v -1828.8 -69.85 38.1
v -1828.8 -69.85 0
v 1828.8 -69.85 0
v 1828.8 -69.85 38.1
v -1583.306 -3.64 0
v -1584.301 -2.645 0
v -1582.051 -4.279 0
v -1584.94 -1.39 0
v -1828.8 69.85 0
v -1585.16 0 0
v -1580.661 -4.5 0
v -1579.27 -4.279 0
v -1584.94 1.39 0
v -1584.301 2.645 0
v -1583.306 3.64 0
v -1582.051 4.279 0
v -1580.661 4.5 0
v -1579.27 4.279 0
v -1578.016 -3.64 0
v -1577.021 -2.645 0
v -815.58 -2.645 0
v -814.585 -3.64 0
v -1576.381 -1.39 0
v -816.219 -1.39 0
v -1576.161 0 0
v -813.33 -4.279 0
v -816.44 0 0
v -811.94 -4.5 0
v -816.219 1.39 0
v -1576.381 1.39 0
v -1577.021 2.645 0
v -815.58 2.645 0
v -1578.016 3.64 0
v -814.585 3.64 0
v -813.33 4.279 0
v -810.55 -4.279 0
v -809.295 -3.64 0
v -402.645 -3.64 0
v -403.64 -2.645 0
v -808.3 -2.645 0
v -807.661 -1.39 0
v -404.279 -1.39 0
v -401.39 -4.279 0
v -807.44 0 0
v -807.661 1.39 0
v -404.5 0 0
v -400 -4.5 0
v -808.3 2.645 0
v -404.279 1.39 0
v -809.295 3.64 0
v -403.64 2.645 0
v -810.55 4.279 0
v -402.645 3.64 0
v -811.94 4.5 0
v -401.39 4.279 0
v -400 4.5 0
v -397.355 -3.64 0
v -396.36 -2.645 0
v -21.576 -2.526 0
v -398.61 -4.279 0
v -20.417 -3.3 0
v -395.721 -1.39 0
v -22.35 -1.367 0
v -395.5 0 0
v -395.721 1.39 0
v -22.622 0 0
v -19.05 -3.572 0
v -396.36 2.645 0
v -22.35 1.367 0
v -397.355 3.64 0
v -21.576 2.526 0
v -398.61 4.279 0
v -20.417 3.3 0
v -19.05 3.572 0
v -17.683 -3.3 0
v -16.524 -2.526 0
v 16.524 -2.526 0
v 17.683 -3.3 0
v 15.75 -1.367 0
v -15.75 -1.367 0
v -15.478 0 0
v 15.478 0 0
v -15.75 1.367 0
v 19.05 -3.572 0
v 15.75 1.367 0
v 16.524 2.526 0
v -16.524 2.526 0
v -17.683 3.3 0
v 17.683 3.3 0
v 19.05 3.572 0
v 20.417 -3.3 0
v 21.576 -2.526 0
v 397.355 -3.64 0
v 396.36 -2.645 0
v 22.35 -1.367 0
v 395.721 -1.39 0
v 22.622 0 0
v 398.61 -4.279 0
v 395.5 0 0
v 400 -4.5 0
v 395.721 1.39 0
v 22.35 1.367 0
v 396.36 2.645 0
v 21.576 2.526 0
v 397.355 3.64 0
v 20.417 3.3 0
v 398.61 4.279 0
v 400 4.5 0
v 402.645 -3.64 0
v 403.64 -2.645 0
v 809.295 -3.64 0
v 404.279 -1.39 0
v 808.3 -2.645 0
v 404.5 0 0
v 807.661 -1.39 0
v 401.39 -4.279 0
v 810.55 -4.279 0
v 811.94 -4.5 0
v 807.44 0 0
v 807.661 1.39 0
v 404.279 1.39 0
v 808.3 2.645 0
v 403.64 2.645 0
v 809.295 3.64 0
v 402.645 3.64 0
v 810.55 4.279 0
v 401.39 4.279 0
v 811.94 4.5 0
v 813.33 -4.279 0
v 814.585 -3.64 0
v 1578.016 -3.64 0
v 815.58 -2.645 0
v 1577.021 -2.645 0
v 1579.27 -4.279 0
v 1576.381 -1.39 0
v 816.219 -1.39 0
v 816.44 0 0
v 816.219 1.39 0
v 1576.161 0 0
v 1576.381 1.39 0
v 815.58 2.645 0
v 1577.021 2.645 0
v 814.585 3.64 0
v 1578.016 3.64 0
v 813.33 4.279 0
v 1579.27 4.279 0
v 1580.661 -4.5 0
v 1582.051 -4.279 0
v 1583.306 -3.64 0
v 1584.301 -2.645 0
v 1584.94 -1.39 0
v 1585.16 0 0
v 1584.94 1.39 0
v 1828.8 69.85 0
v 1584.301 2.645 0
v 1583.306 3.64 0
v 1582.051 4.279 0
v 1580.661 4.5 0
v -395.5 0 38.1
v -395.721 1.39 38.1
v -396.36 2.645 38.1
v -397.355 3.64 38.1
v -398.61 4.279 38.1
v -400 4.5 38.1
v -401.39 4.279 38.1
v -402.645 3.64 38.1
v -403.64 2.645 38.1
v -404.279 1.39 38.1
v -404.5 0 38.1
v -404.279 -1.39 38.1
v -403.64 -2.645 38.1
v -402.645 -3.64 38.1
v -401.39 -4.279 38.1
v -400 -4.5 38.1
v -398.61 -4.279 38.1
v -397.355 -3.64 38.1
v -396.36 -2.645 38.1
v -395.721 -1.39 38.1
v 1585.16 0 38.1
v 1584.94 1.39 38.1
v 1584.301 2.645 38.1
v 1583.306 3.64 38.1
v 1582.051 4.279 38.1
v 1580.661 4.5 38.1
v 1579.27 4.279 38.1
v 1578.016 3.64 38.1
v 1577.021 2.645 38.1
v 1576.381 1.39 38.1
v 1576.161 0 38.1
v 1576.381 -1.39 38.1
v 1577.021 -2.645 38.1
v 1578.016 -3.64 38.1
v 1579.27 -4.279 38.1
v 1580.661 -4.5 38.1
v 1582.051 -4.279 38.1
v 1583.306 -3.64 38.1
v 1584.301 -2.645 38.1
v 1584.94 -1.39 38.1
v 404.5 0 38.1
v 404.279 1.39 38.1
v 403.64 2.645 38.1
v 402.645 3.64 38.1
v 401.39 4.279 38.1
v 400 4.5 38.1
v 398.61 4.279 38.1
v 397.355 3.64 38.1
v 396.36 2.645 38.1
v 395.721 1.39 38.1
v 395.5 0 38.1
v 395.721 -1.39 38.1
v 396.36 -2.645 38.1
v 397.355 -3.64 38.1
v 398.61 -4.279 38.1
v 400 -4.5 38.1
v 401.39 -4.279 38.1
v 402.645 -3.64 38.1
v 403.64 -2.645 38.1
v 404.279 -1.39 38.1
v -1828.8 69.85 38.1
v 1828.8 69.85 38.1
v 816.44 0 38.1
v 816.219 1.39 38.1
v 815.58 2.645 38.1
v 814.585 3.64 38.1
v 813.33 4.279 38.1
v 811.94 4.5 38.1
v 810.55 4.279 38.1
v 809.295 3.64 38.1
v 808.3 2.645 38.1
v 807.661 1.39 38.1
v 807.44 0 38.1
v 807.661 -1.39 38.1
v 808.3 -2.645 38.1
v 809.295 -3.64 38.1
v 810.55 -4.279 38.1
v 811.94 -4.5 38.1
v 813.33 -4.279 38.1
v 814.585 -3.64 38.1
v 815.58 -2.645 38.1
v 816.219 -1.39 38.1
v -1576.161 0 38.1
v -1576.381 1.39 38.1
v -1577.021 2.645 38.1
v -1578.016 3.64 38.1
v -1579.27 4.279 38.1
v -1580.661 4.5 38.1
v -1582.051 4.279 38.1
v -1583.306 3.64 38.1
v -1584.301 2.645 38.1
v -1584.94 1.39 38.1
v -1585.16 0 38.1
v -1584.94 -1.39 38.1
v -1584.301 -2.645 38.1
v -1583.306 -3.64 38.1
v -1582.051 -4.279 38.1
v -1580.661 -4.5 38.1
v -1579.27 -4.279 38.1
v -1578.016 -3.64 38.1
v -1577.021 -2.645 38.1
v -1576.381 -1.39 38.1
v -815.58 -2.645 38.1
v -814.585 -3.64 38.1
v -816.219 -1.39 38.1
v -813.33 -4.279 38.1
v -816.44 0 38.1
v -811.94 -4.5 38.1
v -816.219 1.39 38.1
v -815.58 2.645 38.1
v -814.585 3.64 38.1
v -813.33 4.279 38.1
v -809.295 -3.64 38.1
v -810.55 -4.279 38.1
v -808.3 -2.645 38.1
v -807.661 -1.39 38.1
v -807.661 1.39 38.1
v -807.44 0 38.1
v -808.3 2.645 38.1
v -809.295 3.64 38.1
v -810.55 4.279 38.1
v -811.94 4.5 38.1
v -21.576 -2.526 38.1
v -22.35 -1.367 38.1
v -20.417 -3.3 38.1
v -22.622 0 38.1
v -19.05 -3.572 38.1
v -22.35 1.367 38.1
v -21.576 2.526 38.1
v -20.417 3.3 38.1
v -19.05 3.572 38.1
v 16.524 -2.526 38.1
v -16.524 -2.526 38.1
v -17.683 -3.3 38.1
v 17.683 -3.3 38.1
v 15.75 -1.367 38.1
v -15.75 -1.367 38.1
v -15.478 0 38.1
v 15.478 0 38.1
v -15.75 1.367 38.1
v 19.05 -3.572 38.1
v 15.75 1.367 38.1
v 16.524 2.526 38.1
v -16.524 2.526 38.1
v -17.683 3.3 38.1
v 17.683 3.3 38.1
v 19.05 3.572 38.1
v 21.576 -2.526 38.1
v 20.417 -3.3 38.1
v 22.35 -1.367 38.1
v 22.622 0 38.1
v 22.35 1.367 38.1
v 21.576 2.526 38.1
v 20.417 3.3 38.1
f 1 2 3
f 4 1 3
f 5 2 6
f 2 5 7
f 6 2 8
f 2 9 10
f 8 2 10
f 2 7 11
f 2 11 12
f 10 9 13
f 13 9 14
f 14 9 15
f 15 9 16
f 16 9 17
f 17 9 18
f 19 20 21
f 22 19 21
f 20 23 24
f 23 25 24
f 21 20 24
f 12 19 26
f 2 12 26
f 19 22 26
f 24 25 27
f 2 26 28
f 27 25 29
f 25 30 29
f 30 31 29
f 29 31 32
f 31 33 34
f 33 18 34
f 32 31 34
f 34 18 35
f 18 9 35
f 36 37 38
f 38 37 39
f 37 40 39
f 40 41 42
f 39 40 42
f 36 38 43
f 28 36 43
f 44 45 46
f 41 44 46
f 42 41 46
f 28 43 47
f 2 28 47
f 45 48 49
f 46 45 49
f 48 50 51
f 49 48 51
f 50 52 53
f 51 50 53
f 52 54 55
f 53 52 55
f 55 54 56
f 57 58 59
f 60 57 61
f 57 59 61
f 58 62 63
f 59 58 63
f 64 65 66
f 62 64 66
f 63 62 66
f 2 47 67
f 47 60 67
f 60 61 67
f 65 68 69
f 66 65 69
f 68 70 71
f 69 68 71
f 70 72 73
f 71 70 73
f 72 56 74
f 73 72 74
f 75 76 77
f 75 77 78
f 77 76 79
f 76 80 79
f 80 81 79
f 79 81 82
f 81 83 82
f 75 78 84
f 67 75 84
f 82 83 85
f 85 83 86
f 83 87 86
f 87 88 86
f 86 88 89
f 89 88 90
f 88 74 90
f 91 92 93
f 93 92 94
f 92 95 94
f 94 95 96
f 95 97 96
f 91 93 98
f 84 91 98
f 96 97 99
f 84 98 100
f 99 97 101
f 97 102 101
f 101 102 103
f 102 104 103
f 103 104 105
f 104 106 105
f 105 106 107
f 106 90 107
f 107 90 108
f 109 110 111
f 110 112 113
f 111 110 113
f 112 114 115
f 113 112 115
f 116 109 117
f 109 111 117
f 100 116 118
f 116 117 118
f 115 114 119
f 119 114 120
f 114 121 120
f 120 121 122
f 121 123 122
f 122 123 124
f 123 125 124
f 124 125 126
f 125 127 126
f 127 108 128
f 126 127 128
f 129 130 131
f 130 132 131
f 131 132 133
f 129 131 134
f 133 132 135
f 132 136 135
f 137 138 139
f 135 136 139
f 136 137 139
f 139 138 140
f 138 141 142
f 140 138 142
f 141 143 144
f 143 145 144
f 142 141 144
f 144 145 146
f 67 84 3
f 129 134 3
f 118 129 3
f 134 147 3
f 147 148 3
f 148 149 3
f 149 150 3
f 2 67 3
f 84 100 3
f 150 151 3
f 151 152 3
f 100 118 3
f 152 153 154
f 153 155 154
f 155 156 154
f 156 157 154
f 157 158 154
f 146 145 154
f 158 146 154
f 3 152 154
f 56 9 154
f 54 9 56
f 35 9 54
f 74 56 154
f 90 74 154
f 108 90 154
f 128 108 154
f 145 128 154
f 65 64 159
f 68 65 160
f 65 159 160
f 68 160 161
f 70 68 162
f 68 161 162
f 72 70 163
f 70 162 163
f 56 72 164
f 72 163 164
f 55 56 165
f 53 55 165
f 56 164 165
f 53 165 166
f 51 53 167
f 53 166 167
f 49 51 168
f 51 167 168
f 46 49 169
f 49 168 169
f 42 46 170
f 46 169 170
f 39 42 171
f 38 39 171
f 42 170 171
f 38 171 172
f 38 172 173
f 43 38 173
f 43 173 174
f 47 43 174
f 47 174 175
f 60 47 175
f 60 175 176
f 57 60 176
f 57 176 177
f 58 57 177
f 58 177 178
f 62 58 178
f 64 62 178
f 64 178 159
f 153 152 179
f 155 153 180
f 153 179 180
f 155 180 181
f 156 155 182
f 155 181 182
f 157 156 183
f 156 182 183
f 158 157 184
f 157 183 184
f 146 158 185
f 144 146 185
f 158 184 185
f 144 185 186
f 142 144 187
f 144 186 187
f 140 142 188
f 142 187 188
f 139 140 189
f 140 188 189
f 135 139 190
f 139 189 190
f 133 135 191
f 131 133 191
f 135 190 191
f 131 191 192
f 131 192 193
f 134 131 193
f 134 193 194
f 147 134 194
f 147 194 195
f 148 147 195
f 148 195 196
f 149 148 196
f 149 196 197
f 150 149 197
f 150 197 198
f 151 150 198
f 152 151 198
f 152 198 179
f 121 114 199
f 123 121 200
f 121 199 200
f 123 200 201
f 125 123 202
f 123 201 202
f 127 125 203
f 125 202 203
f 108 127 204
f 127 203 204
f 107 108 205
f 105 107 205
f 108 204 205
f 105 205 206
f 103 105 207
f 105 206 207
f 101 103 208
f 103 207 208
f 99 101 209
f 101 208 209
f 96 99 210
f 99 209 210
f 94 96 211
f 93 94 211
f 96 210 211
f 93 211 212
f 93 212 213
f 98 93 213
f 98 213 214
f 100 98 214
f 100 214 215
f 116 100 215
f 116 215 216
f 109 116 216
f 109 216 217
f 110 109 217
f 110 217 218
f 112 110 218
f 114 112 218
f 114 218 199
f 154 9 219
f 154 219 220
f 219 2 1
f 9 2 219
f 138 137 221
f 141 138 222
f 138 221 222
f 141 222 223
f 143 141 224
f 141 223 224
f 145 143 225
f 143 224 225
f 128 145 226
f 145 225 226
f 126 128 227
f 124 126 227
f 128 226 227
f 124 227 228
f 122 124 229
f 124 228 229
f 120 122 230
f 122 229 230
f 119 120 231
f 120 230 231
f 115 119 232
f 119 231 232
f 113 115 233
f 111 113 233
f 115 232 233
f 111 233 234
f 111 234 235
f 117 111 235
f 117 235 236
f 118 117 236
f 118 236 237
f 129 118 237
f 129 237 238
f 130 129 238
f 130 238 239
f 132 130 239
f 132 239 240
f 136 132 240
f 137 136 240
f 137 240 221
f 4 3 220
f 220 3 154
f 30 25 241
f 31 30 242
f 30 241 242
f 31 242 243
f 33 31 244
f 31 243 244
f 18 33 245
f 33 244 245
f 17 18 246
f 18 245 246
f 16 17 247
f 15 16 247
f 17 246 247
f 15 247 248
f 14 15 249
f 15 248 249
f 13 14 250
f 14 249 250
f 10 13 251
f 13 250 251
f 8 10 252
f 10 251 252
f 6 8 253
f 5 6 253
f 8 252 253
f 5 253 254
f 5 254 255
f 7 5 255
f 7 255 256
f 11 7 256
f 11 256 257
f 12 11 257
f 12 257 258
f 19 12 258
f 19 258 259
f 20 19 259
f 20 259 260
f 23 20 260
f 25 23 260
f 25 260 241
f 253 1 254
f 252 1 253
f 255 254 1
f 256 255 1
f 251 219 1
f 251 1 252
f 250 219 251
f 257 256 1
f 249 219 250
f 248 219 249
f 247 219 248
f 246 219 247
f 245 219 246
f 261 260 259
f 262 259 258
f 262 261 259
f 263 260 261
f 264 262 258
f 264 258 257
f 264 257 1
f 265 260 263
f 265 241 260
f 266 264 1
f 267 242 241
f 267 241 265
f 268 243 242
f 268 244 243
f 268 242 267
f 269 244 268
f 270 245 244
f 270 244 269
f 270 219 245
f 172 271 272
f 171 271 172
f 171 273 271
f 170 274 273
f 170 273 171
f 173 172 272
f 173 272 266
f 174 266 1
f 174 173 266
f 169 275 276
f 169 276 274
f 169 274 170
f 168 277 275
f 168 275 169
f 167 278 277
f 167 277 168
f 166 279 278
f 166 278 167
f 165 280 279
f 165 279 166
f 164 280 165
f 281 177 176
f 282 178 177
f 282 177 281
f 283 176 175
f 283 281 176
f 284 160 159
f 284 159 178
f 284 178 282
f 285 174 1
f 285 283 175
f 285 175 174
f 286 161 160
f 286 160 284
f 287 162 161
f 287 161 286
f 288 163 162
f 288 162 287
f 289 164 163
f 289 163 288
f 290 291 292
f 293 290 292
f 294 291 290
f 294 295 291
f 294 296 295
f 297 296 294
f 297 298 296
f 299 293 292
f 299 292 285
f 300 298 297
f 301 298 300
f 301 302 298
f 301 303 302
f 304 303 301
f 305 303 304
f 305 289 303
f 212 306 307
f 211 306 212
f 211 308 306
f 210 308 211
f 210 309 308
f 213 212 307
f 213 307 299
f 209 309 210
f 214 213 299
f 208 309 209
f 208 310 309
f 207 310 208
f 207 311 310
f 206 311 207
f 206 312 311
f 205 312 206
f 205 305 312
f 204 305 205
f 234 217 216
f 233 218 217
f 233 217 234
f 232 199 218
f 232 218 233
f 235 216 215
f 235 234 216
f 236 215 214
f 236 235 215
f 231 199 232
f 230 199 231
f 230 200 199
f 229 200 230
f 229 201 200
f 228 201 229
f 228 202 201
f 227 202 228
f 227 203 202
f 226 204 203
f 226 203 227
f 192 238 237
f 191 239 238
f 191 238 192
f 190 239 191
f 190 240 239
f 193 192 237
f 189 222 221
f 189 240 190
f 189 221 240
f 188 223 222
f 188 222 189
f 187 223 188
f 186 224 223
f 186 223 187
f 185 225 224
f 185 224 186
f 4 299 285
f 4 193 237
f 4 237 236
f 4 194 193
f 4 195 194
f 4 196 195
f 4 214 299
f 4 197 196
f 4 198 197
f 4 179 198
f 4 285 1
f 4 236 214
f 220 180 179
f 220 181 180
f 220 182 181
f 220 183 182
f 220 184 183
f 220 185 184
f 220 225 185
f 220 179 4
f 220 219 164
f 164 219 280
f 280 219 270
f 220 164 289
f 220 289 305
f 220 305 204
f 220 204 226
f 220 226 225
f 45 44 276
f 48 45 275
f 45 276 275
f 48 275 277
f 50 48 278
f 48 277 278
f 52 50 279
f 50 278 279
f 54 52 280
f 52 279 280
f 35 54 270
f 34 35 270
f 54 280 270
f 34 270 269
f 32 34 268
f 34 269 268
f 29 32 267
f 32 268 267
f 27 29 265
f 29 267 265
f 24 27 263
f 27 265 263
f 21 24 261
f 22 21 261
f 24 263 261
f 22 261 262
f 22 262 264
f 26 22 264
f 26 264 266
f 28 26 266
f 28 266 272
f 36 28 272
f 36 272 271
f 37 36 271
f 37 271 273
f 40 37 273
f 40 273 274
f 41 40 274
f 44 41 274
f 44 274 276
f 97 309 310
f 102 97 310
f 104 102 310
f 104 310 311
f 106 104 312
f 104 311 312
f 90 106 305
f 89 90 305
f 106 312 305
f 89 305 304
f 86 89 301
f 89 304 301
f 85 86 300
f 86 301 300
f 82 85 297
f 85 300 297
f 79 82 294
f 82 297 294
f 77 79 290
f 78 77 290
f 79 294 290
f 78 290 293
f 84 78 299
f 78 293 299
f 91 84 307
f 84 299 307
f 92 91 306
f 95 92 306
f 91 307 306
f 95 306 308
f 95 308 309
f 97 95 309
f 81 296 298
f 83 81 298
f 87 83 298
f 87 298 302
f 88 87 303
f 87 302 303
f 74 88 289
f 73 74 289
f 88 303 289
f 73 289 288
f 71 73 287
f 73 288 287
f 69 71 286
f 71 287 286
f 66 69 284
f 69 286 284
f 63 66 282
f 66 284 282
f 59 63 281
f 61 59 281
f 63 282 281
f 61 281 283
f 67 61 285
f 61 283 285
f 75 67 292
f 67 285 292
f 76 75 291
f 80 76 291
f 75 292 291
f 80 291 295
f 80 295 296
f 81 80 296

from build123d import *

# Parameters (mm, degrees)
SKETCH1_W           = 3657.6
SKETCH1_H           = 139.7
BOSS_EXTRUDE1_DEPTH = 38.1
SKETCH3_R           = 3.571875
CUT_EXTRUDE2_DEPTH  = 1831.529997706
SKETCH5_R           = 4.49961
CUT_EXTRUDE3_DEPTH  = 1831.529997706
SKETCH6_R           = 4.4996
CUT_EXTRUDE4_DEPTH  = 1831.529997706


with BuildPart() as part:
    # Sketch1 → Boss-Extrude1 (new body)
    with BuildSketch(Plane.XY):
        Rectangle(SKETCH1_W, SKETCH1_H)
    extrude(amount=BOSS_EXTRUDE1_DEPTH)

    # Sketch3 → Cut-Extrude2 (cut, through all)
    with BuildSketch(Plane.XY.offset(38.1)):
        with Locations((-19.05, 0)):
            Circle(SKETCH3_R)
        with Locations((19.05, 0)):
            Circle(SKETCH3_R)
    extrude(amount=-CUT_EXTRUDE2_DEPTH, mode=Mode.SUBTRACT)

    # Sketch5 → Cut-Extrude3 (cut, through all)
    with BuildSketch(Plane.XY.offset(38.1)):
        with Locations((400, 0)):
            Circle(SKETCH5_R)
        with Locations((-400, 0)):
            Circle(SKETCH5_R)
    extrude(amount=-CUT_EXTRUDE3_DEPTH, mode=Mode.SUBTRACT)

    # Sketch6 → Cut-Extrude4 (cut, through all)
    with BuildSketch(Plane.XY.offset(38.1)):
        with Locations((811.94, 0)):
            Circle(SKETCH6_R)
        with Locations((1580.6608, 0)):
            Circle(SKETCH6_R)
        with Locations((-1580.6608, 0)):
            Circle(SKETCH6_R)
        with Locations((-811.94, 0)):
            Circle(SKETCH6_R)
    extrude(amount=-CUT_EXTRUDE4_DEPTH, mode=Mode.SUBTRACT)


solid = part.part
